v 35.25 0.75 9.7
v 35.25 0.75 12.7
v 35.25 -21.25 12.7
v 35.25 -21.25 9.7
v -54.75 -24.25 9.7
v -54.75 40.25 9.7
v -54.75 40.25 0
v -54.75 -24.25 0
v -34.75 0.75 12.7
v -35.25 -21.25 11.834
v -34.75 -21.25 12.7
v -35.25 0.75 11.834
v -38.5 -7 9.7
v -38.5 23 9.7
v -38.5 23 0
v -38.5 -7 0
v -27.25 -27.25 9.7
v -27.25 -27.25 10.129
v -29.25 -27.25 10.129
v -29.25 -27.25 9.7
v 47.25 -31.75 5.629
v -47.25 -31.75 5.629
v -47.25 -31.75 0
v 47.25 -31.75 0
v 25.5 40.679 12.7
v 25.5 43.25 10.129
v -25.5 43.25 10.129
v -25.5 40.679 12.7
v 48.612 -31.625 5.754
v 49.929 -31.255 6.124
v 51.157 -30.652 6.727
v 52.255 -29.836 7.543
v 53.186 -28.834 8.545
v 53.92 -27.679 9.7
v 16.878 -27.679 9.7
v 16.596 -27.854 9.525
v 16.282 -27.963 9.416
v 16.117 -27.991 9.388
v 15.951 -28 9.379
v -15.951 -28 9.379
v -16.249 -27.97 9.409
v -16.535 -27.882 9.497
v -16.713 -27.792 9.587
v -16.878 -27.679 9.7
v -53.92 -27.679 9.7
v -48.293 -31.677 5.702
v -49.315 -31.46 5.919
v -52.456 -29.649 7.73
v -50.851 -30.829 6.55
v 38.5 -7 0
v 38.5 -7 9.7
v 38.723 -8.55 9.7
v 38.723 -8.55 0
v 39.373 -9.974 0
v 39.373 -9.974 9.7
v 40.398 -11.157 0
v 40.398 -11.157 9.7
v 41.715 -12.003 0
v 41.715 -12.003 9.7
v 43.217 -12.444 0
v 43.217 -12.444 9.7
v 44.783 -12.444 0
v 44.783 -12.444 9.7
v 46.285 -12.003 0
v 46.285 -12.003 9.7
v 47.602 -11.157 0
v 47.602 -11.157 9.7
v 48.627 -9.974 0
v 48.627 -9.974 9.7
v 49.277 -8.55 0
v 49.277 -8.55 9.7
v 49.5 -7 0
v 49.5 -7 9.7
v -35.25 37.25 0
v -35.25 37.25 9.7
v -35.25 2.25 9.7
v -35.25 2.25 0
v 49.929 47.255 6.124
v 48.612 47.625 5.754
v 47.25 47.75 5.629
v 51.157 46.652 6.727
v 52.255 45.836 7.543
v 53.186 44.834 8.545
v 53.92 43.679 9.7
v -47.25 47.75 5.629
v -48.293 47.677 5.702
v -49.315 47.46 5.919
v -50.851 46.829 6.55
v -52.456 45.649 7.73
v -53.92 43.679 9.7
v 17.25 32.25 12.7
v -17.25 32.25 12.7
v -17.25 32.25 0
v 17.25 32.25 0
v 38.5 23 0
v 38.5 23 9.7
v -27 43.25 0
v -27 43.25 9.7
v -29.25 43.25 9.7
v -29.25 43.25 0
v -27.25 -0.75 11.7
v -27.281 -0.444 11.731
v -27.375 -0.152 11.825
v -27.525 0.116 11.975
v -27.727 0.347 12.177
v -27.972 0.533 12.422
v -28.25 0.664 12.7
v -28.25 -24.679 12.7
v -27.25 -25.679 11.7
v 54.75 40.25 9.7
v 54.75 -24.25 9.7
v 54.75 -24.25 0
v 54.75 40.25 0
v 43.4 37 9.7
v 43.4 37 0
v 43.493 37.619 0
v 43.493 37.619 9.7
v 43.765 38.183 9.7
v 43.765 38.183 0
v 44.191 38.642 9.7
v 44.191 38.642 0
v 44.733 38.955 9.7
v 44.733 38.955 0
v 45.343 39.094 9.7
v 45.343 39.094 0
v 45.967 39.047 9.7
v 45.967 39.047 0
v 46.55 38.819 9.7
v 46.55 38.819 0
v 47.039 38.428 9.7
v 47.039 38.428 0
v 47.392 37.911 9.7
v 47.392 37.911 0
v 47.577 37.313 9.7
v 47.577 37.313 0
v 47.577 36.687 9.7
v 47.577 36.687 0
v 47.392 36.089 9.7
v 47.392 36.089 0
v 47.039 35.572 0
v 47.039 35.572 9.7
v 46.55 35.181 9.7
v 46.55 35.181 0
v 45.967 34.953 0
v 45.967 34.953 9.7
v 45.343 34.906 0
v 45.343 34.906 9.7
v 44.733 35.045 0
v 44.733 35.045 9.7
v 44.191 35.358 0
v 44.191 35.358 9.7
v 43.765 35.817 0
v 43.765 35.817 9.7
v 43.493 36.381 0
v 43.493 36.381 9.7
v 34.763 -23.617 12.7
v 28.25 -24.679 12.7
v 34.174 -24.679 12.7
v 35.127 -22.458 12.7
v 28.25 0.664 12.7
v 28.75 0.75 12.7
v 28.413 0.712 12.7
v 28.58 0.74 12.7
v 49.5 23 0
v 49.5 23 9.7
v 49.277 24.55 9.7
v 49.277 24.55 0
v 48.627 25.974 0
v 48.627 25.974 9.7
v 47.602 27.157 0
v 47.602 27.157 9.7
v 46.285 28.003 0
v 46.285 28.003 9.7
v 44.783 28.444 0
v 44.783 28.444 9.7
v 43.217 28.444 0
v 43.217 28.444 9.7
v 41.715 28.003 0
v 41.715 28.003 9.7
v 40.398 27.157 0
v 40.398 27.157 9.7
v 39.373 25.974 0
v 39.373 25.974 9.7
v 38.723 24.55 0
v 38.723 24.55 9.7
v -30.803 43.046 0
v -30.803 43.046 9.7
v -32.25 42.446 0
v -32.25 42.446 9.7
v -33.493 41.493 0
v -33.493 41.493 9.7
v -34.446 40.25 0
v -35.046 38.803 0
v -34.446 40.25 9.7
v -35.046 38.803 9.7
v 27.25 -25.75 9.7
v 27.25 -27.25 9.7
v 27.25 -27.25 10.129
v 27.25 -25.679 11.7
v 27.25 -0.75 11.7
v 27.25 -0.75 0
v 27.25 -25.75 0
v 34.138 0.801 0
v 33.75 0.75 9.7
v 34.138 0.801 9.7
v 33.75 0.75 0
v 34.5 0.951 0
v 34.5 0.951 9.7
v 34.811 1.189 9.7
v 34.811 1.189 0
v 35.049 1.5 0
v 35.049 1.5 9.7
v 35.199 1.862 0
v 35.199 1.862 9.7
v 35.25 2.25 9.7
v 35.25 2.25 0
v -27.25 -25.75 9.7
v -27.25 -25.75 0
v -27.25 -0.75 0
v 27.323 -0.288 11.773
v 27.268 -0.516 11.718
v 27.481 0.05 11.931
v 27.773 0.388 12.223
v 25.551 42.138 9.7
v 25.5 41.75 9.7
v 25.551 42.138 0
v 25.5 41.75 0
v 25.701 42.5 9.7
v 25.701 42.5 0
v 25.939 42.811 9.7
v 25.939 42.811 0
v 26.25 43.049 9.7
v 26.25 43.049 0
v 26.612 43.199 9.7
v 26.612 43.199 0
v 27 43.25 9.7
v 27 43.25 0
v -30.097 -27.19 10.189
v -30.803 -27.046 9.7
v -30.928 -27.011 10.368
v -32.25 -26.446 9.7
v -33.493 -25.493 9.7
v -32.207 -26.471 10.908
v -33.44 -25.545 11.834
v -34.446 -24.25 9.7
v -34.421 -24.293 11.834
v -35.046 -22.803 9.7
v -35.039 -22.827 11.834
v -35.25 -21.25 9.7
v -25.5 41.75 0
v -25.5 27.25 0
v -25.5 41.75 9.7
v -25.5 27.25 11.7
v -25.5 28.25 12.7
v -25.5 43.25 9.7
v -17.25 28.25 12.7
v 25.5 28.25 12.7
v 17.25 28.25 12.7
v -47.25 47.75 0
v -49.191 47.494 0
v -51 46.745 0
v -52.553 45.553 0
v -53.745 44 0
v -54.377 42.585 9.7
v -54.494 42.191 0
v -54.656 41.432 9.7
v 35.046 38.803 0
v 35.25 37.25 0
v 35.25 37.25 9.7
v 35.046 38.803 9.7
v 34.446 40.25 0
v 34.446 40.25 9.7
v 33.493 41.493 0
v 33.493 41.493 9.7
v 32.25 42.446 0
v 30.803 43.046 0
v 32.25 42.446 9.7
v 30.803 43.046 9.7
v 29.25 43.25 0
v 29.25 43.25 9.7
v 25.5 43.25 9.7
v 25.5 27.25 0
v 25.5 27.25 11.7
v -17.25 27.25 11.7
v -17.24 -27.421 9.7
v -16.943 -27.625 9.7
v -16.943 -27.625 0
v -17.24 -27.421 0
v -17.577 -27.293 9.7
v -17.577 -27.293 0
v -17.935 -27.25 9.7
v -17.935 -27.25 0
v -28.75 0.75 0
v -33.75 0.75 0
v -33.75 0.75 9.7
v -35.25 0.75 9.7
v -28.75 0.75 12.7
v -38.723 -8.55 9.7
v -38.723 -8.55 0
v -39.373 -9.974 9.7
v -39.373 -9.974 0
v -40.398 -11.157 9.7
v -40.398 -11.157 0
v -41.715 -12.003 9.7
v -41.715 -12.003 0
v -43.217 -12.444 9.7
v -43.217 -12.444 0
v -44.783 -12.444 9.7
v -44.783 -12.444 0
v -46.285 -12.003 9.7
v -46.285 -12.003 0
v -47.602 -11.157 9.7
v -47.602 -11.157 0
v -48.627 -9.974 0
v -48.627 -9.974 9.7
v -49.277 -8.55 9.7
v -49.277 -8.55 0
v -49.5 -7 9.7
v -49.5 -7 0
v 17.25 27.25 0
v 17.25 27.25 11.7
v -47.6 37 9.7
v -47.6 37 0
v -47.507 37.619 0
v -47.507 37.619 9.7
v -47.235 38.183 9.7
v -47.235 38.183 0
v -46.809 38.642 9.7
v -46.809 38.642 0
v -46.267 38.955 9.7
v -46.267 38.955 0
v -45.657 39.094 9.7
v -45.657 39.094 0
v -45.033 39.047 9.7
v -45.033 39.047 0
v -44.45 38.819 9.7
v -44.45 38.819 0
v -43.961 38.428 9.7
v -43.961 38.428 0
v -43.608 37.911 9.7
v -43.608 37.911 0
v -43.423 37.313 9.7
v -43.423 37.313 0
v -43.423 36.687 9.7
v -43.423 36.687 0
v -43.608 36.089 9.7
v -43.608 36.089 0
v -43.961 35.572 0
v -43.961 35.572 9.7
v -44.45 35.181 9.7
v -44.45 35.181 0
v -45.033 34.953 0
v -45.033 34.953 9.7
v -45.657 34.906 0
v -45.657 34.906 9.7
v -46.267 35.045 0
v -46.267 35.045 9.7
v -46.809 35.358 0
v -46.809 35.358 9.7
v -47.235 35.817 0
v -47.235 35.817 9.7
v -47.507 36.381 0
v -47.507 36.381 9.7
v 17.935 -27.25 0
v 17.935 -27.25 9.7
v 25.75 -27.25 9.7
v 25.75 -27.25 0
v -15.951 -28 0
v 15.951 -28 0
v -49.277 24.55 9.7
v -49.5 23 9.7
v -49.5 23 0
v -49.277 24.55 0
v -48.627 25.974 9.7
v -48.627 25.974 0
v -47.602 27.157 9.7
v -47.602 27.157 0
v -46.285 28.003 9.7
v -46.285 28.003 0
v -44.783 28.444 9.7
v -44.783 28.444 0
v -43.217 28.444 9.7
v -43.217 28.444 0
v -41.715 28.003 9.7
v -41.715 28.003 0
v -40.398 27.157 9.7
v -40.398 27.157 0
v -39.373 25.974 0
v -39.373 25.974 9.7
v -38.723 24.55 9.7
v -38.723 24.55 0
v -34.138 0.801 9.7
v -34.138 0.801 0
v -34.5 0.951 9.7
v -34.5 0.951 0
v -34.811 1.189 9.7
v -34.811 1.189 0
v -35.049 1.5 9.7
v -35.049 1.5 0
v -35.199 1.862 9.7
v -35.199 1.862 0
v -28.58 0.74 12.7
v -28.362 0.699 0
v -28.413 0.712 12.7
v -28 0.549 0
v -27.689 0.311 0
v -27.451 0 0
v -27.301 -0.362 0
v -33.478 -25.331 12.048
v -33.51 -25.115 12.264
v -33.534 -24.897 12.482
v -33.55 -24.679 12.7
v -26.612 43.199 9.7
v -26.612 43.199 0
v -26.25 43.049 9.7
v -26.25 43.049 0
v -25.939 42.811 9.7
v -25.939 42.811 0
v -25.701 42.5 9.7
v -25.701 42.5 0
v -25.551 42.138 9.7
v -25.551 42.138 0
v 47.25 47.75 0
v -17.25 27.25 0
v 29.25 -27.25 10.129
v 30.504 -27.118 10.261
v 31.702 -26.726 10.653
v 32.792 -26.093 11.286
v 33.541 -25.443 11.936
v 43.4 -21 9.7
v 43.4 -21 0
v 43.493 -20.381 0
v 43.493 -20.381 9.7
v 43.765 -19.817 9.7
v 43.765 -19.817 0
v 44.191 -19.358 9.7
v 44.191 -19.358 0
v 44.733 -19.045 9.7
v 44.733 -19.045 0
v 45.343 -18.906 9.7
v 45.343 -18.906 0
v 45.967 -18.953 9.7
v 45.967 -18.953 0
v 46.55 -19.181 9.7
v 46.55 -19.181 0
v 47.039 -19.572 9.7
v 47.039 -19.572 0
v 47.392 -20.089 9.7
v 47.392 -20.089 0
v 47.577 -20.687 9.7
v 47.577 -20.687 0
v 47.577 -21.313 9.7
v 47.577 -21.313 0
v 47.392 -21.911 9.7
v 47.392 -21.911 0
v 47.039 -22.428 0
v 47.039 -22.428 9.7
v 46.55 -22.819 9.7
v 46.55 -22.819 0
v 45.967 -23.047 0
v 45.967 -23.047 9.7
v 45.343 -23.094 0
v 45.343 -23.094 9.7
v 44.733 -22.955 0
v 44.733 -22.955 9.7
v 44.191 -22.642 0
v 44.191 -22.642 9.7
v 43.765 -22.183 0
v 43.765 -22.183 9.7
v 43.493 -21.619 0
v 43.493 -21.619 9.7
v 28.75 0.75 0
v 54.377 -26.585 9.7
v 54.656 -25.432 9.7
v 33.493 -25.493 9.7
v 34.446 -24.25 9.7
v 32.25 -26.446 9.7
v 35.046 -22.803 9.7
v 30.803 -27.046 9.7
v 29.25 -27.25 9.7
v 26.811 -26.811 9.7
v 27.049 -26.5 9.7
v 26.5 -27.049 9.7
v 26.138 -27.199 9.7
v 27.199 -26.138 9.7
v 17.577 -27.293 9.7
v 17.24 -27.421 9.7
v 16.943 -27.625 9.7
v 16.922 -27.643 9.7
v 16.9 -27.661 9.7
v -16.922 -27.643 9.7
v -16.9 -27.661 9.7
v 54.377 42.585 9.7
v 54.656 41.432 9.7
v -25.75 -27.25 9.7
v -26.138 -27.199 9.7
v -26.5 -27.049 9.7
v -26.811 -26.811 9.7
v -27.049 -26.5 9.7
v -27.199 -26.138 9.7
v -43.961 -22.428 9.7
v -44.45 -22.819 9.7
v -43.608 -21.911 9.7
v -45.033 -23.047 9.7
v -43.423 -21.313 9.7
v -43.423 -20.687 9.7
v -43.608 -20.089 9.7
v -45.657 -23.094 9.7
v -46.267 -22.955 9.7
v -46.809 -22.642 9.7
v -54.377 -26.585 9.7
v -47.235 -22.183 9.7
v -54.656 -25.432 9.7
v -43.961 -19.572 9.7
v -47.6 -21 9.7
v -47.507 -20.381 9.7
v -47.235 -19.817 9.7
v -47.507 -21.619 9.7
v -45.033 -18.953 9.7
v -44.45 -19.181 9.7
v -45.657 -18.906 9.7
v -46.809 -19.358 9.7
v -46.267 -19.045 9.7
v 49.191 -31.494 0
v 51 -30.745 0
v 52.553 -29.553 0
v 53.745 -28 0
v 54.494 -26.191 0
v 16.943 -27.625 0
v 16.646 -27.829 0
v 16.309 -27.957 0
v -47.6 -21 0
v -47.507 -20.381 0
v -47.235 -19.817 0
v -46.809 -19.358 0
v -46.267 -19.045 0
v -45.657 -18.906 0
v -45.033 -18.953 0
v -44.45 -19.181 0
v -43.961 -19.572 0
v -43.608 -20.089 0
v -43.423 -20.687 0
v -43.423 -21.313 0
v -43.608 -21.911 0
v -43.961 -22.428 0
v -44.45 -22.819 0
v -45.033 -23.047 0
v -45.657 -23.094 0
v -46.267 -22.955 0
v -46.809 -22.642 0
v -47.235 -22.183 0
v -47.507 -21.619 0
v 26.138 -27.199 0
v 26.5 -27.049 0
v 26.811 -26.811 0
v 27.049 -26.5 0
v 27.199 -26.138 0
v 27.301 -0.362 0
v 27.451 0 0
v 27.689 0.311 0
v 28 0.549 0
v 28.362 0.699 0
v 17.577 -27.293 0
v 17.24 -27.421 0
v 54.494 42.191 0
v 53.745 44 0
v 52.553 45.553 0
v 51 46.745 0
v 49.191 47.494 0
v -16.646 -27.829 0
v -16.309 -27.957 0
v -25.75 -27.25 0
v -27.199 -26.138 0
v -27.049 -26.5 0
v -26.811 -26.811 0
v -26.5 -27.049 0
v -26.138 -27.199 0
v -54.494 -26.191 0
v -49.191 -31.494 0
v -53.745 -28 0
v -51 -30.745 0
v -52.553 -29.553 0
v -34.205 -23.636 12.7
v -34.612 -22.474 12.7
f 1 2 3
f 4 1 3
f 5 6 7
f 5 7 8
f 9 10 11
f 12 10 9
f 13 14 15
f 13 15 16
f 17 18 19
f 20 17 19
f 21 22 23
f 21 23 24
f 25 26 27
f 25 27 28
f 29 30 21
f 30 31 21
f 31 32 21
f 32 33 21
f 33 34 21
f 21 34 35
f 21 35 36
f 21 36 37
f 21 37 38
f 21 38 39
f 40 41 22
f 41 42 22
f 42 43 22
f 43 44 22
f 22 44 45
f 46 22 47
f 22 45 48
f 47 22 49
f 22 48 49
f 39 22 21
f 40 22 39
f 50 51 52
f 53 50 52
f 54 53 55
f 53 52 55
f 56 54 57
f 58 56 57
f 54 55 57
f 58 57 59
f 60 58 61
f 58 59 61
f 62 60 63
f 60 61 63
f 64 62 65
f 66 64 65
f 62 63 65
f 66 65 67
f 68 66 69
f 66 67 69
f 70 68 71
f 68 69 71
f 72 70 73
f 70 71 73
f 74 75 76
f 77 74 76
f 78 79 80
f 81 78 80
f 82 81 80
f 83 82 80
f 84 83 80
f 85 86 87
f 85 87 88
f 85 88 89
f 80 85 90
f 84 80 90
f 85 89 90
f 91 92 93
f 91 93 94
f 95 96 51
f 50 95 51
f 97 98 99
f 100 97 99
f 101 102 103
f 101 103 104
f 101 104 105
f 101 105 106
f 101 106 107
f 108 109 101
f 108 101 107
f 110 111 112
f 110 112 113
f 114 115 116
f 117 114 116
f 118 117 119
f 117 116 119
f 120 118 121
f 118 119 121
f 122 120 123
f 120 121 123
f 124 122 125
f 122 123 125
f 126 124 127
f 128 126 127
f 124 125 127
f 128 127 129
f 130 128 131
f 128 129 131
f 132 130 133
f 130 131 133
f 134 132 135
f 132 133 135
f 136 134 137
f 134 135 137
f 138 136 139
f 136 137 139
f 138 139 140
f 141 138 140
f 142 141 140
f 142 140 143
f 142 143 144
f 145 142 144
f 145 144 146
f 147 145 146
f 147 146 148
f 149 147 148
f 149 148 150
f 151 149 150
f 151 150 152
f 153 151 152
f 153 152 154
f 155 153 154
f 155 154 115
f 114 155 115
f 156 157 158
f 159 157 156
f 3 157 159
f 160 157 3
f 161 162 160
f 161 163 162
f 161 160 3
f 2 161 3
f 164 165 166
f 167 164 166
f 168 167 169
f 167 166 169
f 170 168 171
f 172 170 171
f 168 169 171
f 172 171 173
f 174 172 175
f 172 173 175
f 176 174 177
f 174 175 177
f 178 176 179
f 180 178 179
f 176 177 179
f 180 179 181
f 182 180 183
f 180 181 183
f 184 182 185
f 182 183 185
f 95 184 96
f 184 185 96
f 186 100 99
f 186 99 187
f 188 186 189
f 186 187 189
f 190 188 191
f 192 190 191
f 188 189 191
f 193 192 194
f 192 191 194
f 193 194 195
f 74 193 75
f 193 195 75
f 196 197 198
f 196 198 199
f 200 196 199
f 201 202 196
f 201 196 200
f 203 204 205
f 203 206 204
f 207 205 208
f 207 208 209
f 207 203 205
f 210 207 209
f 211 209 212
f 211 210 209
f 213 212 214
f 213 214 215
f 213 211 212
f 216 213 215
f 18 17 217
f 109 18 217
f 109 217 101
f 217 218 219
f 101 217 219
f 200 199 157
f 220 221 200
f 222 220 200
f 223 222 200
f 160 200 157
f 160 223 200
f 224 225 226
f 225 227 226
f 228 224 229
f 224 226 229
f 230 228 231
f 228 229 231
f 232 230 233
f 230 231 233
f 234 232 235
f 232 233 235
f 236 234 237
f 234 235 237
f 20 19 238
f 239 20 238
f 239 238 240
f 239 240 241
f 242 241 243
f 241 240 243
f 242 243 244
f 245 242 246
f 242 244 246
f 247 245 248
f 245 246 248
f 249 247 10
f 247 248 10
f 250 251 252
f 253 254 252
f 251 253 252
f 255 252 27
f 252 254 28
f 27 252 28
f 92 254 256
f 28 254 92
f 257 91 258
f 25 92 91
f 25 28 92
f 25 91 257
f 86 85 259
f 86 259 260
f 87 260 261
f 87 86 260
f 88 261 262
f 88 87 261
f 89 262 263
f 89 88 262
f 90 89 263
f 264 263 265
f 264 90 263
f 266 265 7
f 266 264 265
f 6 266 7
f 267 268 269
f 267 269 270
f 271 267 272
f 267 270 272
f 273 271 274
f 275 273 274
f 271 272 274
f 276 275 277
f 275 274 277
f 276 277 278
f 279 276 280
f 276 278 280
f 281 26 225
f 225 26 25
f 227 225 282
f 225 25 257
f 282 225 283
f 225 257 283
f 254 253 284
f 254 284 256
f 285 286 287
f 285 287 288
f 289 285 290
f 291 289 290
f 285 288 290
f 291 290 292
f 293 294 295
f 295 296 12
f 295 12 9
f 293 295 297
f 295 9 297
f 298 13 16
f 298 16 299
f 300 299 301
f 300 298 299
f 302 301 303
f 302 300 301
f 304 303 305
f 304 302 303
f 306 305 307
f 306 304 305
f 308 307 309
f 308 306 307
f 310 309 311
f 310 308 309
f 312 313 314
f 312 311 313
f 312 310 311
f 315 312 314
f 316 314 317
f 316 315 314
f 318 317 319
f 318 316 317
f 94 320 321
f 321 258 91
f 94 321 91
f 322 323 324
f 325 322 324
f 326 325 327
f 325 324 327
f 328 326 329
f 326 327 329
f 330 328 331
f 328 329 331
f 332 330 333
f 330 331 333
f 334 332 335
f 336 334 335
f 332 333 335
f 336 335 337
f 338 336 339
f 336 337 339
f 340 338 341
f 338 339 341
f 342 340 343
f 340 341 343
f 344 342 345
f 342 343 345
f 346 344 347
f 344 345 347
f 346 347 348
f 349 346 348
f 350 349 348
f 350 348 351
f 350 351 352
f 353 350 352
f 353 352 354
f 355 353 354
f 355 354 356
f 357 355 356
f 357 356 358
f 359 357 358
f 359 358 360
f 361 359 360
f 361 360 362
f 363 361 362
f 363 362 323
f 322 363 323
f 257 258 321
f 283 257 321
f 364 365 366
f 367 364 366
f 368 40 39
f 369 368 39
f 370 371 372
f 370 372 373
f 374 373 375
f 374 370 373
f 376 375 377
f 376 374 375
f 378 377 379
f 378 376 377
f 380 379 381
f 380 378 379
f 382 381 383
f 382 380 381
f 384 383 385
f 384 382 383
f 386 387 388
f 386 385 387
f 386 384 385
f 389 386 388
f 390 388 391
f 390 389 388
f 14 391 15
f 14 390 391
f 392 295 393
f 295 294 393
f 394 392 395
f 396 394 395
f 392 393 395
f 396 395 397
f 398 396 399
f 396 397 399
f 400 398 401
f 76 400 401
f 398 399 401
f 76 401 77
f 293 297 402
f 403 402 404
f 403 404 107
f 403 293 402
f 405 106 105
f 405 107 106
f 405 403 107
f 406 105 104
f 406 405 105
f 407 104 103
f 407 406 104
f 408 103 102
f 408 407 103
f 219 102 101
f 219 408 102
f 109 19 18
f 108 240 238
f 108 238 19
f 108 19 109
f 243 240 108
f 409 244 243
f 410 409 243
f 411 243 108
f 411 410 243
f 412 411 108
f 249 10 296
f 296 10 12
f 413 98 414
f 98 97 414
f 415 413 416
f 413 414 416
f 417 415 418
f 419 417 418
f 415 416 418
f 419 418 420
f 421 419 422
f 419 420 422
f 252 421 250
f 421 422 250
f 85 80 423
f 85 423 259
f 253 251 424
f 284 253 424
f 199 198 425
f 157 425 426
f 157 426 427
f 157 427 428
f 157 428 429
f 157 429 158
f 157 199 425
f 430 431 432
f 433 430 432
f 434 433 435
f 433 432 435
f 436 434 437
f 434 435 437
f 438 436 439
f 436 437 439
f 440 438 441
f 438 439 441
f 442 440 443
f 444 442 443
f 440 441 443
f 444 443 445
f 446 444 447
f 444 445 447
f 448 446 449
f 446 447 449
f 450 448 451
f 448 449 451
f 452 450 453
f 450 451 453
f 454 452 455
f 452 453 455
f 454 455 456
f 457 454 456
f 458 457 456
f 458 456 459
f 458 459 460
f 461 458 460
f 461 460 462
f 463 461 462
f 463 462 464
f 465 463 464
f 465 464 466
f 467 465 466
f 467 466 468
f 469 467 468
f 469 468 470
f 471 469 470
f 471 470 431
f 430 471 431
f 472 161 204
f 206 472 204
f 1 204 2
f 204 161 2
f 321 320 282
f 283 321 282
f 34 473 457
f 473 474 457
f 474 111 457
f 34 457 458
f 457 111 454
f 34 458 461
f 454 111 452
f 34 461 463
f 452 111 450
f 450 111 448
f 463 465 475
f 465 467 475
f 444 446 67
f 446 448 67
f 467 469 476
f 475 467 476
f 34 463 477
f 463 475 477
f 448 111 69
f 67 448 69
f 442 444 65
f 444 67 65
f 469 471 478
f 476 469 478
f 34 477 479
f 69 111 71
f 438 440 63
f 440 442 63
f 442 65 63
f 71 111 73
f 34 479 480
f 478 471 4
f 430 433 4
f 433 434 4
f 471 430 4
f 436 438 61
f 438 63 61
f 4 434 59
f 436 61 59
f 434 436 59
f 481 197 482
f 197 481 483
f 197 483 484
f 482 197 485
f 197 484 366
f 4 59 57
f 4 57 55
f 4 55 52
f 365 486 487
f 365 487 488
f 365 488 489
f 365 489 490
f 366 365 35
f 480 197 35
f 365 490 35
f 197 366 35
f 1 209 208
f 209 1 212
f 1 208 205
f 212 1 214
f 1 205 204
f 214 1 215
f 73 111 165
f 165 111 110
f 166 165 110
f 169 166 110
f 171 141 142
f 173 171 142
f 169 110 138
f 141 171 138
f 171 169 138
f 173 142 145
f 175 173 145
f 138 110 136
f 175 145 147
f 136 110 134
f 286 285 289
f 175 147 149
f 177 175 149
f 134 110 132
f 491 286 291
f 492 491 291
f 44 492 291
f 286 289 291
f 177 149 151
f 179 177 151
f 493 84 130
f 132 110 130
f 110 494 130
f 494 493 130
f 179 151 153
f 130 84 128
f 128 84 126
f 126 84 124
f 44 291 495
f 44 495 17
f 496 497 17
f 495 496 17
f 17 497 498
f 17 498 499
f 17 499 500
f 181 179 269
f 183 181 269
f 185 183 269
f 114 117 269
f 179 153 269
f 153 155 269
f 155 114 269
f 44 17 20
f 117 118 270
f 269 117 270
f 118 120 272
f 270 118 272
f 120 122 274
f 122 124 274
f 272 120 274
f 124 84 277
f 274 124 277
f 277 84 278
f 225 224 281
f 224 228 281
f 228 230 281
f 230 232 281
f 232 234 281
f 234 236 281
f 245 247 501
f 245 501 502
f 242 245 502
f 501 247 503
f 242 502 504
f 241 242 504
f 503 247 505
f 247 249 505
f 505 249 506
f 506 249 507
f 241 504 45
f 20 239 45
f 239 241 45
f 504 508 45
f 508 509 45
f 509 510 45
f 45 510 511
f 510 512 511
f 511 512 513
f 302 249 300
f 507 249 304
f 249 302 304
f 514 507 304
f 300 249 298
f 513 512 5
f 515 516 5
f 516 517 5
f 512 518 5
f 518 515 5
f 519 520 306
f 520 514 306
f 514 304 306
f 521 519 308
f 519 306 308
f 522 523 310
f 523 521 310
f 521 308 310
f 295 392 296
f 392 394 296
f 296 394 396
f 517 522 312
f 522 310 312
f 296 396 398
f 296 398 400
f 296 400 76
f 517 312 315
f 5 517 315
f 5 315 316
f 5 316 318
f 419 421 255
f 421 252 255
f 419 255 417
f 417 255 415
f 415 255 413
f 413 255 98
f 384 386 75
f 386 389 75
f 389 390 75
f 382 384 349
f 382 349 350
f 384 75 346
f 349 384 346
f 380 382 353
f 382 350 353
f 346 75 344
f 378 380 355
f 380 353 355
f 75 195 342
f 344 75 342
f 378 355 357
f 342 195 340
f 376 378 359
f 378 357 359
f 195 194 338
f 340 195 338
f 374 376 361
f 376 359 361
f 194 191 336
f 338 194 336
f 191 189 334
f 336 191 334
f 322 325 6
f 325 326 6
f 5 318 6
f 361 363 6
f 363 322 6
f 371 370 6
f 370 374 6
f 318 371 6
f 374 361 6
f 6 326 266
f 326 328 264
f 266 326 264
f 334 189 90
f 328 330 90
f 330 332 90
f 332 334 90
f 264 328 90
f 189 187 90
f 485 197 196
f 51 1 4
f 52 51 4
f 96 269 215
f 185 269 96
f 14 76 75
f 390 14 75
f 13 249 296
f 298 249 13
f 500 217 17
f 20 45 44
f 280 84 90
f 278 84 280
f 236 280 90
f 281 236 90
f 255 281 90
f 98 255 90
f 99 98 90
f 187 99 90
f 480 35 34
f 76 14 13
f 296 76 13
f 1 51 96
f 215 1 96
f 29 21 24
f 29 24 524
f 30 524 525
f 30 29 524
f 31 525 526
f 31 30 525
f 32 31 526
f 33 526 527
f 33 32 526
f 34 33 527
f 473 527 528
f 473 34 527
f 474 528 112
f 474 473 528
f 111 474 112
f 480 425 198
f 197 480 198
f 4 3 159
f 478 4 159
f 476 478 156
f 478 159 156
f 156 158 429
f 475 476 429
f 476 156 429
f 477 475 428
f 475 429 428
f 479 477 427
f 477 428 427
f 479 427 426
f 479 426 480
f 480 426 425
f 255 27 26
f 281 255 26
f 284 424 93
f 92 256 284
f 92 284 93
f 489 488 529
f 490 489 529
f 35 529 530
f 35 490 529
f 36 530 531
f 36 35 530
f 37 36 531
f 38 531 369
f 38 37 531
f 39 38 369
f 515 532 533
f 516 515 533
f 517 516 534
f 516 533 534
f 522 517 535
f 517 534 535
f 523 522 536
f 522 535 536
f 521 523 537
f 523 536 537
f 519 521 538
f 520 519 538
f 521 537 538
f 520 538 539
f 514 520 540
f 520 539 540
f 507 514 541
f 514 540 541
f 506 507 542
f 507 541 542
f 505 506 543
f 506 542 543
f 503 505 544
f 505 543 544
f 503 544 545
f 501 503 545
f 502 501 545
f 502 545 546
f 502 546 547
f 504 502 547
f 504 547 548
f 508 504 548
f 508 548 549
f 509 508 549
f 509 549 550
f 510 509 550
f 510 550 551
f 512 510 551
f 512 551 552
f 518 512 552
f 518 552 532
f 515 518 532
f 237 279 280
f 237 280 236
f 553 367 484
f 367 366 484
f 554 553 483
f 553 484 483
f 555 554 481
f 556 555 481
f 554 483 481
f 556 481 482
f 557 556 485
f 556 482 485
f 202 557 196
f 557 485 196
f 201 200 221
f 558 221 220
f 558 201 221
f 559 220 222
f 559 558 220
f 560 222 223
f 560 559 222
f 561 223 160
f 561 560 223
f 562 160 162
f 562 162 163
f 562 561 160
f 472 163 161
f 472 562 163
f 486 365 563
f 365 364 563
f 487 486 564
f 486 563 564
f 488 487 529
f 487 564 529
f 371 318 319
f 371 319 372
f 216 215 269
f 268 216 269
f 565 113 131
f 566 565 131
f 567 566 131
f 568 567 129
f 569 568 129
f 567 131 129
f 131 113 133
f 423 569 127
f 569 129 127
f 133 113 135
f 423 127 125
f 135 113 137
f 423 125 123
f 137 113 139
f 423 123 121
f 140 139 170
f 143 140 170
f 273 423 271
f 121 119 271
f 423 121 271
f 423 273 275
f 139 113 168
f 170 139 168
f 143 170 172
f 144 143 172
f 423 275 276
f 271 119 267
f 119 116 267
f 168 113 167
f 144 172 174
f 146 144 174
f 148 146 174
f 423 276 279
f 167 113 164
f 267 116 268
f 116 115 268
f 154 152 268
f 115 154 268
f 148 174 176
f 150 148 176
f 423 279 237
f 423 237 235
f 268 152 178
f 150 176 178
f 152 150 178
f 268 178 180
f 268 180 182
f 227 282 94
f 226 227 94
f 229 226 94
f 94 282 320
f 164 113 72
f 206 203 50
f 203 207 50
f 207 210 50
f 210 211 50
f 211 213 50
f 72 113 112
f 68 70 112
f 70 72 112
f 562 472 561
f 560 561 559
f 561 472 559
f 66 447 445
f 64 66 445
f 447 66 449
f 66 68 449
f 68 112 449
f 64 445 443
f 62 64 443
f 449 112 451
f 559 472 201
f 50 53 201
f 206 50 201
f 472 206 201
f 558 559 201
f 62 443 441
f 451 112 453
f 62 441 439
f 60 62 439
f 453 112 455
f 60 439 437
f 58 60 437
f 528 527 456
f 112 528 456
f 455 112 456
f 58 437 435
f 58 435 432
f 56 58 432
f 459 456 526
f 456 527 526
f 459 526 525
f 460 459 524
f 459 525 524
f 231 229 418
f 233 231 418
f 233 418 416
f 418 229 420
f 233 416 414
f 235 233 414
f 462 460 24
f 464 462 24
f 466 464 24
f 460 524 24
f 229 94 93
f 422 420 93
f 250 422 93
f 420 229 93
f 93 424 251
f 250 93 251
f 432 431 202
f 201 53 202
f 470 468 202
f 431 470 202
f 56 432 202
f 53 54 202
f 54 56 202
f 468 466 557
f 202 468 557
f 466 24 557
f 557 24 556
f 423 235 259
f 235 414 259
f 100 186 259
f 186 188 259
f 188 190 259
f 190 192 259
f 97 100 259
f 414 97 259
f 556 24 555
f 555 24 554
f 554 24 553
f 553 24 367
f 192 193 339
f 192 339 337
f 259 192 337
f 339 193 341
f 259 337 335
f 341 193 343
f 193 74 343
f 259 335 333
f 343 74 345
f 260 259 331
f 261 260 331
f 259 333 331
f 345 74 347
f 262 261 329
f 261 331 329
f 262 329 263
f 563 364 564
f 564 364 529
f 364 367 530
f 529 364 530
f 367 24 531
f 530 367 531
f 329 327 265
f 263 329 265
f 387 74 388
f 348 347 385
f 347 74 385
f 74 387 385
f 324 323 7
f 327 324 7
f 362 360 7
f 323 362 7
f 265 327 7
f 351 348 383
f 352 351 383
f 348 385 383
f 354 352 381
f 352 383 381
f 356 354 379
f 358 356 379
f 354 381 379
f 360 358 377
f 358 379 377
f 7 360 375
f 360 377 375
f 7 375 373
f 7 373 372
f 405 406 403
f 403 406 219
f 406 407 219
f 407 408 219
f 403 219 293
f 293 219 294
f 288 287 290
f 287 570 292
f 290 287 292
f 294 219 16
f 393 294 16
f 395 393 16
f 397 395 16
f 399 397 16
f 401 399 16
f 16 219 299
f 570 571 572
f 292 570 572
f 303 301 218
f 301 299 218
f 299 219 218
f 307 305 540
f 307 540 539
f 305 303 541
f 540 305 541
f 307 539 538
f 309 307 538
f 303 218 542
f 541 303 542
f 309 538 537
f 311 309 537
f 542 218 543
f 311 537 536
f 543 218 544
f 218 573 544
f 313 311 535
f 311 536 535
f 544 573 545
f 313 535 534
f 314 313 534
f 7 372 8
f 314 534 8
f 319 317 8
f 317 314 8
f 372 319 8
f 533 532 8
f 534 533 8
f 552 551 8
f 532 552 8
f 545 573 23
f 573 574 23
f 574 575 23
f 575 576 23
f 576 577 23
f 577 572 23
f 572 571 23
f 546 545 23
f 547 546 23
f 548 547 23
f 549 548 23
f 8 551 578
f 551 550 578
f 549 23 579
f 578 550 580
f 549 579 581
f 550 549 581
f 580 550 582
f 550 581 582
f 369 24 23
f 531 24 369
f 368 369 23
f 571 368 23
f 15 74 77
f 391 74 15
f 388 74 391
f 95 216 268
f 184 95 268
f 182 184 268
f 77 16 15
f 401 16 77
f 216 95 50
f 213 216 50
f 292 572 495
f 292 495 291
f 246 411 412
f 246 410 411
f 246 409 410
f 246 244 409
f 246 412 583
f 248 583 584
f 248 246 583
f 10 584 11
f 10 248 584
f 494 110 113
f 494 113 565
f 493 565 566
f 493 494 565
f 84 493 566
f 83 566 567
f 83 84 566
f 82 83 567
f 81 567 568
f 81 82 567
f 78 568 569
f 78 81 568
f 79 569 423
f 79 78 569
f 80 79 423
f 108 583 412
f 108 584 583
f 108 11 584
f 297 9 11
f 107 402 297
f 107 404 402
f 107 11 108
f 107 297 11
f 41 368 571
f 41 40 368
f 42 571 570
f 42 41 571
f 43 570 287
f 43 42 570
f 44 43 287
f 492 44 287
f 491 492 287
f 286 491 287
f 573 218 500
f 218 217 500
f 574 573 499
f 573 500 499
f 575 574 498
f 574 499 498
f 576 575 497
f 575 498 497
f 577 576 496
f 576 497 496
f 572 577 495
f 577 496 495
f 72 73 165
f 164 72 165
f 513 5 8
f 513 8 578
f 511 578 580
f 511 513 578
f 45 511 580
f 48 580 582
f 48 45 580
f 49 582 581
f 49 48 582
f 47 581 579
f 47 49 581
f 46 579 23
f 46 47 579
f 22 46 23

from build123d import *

# Parameters (mm, degrees)
SKETCH1_W                   = 79.5
SKETCH1_H                   = 79.5
SKETCH1_W_2                 = 54.5
SKETCH1_H_2                 = 54.5
BOSS_EXTRUDE1_DEPTH         = 12.7
CHAMFER2_SIZE               = 4
SKETCH2_W                   = 34.5
SKETCH2_H                   = 5
SKETCH2_H_2                 = 0.75
CUT_EXTRUDE1_DEPTH          = 64.41462765
BOSS_EXTRUDE2_DEPTH         = 12.7
CUT_EXTRUDE2_DEPTH          = 3
CUT_EXTRUDE3_DEPTH          = 121.131604917
CHAMFER5_SIZE               = 0.5
CHAMFER5_SIZE2              = 0.866025404
TAP_DRILL_FOR_M5X0_8_TAP3_D = 4.2
CUT_EXTRUDE4_DEPTH          = 74.291984555
FILLET1_R                   = 1.5
FILLET2_R                   = 1.5
FILLET3_R                   = 1.5
CHAMFER4_SIZE               = 1


with BuildPart() as part:
    # Sketch1 → Boss-Extrude1 (new body)
    with BuildSketch(Plane.XY):
        with Locations((0, 8)):
            Rectangle(SKETCH1_W, SKETCH1_H)
        Rectangle(SKETCH1_W_2, SKETCH1_H_2, mode=Mode.SUBTRACT)
    extrude(amount=BOSS_EXTRUDE1_DEPTH)

    # Chamfer2
    chamfer2_edges = [part.edges().sort_by_distance(p)[0] for p in [
        (39.75, -31.75, 6.35),
        (-39.75, -31.75, 6.35),
        (-39.75, 47.75, 6.35),
        (39.75, 47.75, 6.35),
    ]]
    chamfer(chamfer2_edges, length=CHAMFER2_SIZE)

    # Sketch2 → Cut-Extrude1 (cut, through all)
    with BuildSketch(Plane.XY.offset(12.7)):
        with BuildLine():
            Line((-27.25, 27.25), (-25.5, 27.25))
            Line((-25.5, 27.25), (-25.5, 43.25))
            Line((-25.5, 43.25), (-29.25, 43.25))
            ThreePointArc((-29.25, 43.25), (-33.492640687, 41.492640687), (-35.25, 37.25))
            Line((-35.25, 37.25), (-35.25, 0.75))
            Line((-35.25, 0.75), (-27.25, 0.75))
            Line((-27.25, 0.75), (-27.25, 27.25))
        make_face()
        with Locations((0, 29.75)):
            Rectangle(SKETCH2_W, SKETCH2_H)
        with BuildLine():
            Line((25.5, 43.25), (25.5, 27.25))
            Line((25.5, 27.25), (27.25, 27.25))
            Line((27.25, 27.25), (27.25, 0.75))
            Line((27.25, 0.75), (35.25, 0.75))
            Line((35.25, 0.75), (35.25, 37.25))
            ThreePointArc((35.25, 37.25), (33.492640687, 41.492640687), (29.25, 43.25))
            Line((29.25, 43.25), (25.5, 43.25))
        make_face()
        with Locations((0, -27.625)):
            Rectangle(SKETCH2_W, SKETCH2_H_2)
    extrude(amount=-CUT_EXTRUDE1_DEPTH, mode=Mode.SUBTRACT)

    # Sketch5 → Boss-Extrude2 (add)
    with BuildSketch(Plane.XY.offset(12.7)):
        with BuildLine():
            Line((-47.25, -31.75), (-35.75, -31.75))
            Line((-35.75, -31.75), (-39.75, -27.75))
            Line((-39.75, -27.75), (-39.75, 43.75))
            Line((-39.75, 43.75), (-35.75, 47.75))
            Line((-35.75, 47.75), (-47.25, 47.75))
            ThreePointArc((-47.25, 47.75), (-52.553300859, 45.553300859), (-54.75, 40.25))
            Line((-54.75, 40.25), (-54.75, -24.25))
            ThreePointArc((-54.75, -24.25), (-52.553300859, -29.553300859), (-47.25, -31.75))
        make_face()
        with BuildLine():
            Line((35.75, -31.75), (47.25, -31.75))
            ThreePointArc((47.25, -31.75), (52.553300859, -29.553300859), (54.75, -24.25))
            Line((54.75, -24.25), (54.75, 40.25))
            ThreePointArc((54.75, 40.25), (52.553300859, 45.553300859), (47.25, 47.75))
            Line((47.25, 47.75), (35.75, 47.75))
            Line((35.75, 47.75), (39.75, 43.75))
            Line((39.75, 43.75), (39.75, -27.75))
            Line((39.75, -27.75), (35.75, -31.75))
        make_face()
    extrude(amount=-BOSS_EXTRUDE2_DEPTH)

    # Sketch7 → Cut-Extrude2 (cut)
    with BuildSketch(Plane.XY.offset(12.7)):
        with BuildLine():
            ThreePointArc((54.75, 40.25), (52.553300859, 45.553300859), (47.25, 47.75))
            Line((47.25, 47.75), (-47.25, 47.75))
            ThreePointArc((-47.25, 47.75), (-52.553300859, 45.553300859), (-54.75, 40.25))
            Line((-54.75, 40.25), (-54.75, -24.25))
            ThreePointArc((-54.75, -24.25), (-52.553300859, -29.553300859), (-47.25, -31.75))
            Line((-47.25, -31.75), (47.25, -31.75))
            ThreePointArc((47.25, -31.75), (52.553300859, -29.553300859), (54.75, -24.25))
            Line((54.75, -24.25), (54.75, 40.25))
        make_face()
        with BuildLine():
            ThreePointArc((35.25, -21.25), (33.492640687, -25.492640687), (29.25, -27.25))
            Line((29.25, -27.25), (27.25, -27.25))
            Line((27.25, -27.25), (17.25, -27.25))
            Line((17.25, -27.25), (17.25, -28))
            Line((17.25, -28), (-17.25, -28))
            Line((-17.25, -28), (-17.25, -27.25))
            Line((-17.25, -27.25), (-27.25, -27.25))
            Line((-27.25, -27.25), (-29.25, -27.25))
            ThreePointArc((-29.25, -27.25), (-33.492640687, -25.492640687), (-35.25, -21.25))
            Line((-35.25, -21.25), (-35.25, 0.75))
            Line((-35.25, 0.75), (-35.25, 37.25))
            ThreePointArc((-35.25, 37.25), (-33.492640687, 41.492640687), (-29.25, 43.25))
            Line((-29.25, 43.25), (-25.5, 43.25))
            Line((-25.5, 43.25), (25.5, 43.25))
            Line((25.5, 43.25), (29.25, 43.25))
            ThreePointArc((29.25, 43.25), (33.492640687, 41.492640687), (35.25, 37.25))
            Line((35.25, 37.25), (35.25, 0.75))
            Line((35.25, 0.75), (35.25, -21.25))
        make_face(mode=Mode.SUBTRACT)
    extrude(amount=-CUT_EXTRUDE2_DEPTH, mode=Mode.SUBTRACT)

    # Sketch8 → Cut-Extrude3 (cut, through all)
    with BuildSketch(Plane.ZY.offset(54.75)):
        Polygon((5.628932188, -31.75), (12.7, -24.678932188), (12.7, -31.75), align=None)
        Polygon((12.7, 47.75), (5.628932188, 47.75), (12.7, 40.678932188), align=None)
    extrude(amount=-CUT_EXTRUDE3_DEPTH, mode=Mode.SUBTRACT)

    # Chamfer5
    chamfer5_edges = [part.edges().sort_by_distance(p)[0] for p in [
        (-35.25, -10.25, 12.7),
        (-34.974594209, -23.046947729, 12.7),
    ]]
    chamfer5_side = [part.faces().sort_by_distance(p)[0] for p in [
        (-31.22846957, -11.895050932, 12.7),
    ]]
    chamfer(chamfer5_edges, length=CHAMFER5_SIZE, length2=CHAMFER5_SIZE2, reference=chamfer5_side[0])

    # Tap Drill for M5x0.8 Tap3 (through all)
    with Locations(Plane.XY.offset(9.7)):
        with Locations((-45.5, 37), (-45.5, -21), (45.5, -21), (45.5, 37)):
            Hole(TAP_DRILL_FOR_M5X0_8_TAP3_D / 2)

    # Sketch11 → Cut-Extrude4 (cut, through all)
    with BuildSketch(Plane.XY.offset(9.7)):
        with BuildLine():
            Line((-38.5, 23), (-38.5, -7))
            ThreePointArc((-38.5, -7), (-44, -12.5), (-49.5, -7))
            Line((-49.5, -7), (-49.5, 23))
            ThreePointArc((-49.5, 23), (-44, 28.5), (-38.5, 23))
        make_face()
        with BuildLine():
            Line((38.5, 23), (38.5, -7))
            ThreePointArc((38.5, -7), (44, -12.5), (49.5, -7))
            Line((49.5, -7), (49.5, 23))
            ThreePointArc((49.5, 23), (44, 28.5), (38.5, 23))
        make_face()
    extrude(amount=-CUT_EXTRUDE4_DEPTH, mode=Mode.SUBTRACT)

    # Fillet1
    fillet1_edges = [part.edges().sort_by_distance(p)[0] for p in [
        (-27.25, -27.25, 4.85),
        (27.25, -27.25, 4.85),
        (-25.5, 43.25, 4.85),
        (-27.25, 0.75, 6.35),
        (-35.25, 0.75, 4.85),
        (35.25, 0.75, 4.85),
        (27.25, 0.75, 6.35),
        (25.5, 43.25, 4.85),
    ]]
    fillet(fillet1_edges, radius=FILLET1_R)

    # Fillet2
    # the kernel refuses this fillet: 1.5 mm, written as the material it adds along each edge
    with BuildSketch(Plane(origin=(17.25, -28, 12.626527452), x_dir=(0, 1, 0), z_dir=(0, 0, -1))) as fillet2_piece_1_section:
        with BuildLine():
            CenterArc((1.5, -1.299038106), FILLET2_R, 120, 60)
            Line((0, -1.299038106), (-0.03, -1.299038106))
            Line((-0.03, -1.299038106), (-0.03, 0))
            Line((-0.03, 0), (0, 0.03))
            ThreePointArc((0, 0.03), (0.375, 0.03), (0.735, 0.025980762))
            Line((0.735, 0.025980762), (0.75, 0))
        make_face()
    fillet2_piece_1 = extrude(amount=12.626527452, mode=Mode.PRIVATE)
    fillet2_piece_1 = split(fillet2_piece_1, bisect_by=Plane(origin=(16.927844244, -27.803524046, 9.7), z_dir=(0, 0, -1)), keep=Keep.TOP, mode=Mode.PRIVATE)
    fillet2_piece_1 = split(fillet2_piece_1, bisect_by=Plane(origin=(16.927844244, -30.206033858, 7.17289833), z_dir=(0, 0.7071067811865475, -0.7071067811865477)), keep=Keep.TOP, mode=Mode.PRIVATE)
    add(fillet2_piece_1)
    with BuildSketch(Plane(origin=(-17.25, -28, 12.626527452), x_dir=(1, 0, 0), z_dir=(0, 0, -1))) as fillet2_piece_2_section:
        with BuildLine():
            CenterArc((1.299038106, -1.5), FILLET2_R, 90, 60)
            Line((0, -0.75), (-0.025980762, -0.735))
            ThreePointArc((-0.025980762, -0.735), (-0.03, -0.375), (-0.03, 0))
            Line((-0.03, 0), (0, 0.03))
            Line((0, 0.03), (1.299038106, 0.03))
            Line((1.299038106, 0.03), (1.299038106, 0))
        make_face()
    fillet2_piece_2 = extrude(amount=12.626527452, mode=Mode.PRIVATE)
    fillet2_piece_2 = split(fillet2_piece_2, bisect_by=Plane(origin=(-16.927844244, -27.803524046, 9.7), z_dir=(0, 0, -1)), keep=Keep.TOP, mode=Mode.PRIVATE)
    fillet2_piece_2 = split(fillet2_piece_2, bisect_by=Plane(origin=(-16.927844244, -30.206033859, 7.172898329), z_dir=(0, 0.7071067811865475, -0.7071067811865477)), keep=Keep.TOP, mode=Mode.PRIVATE)
    add(fillet2_piece_2)

    # Fillet3
    fillet3_edges = [part.edges().sort_by_distance(p)[0] for p in [
        (-17.25, -27.25, 4.85),
        (17.25, -27.25, 4.85),
    ]]
    fillet(fillet3_edges, radius=FILLET3_R)

    # Chamfer4
    # the kernel refuses this chamfer: 1 mm, written as the material it takes off along each edge
    with BuildSketch(Plane(origin=(-27.25, -27.250615176, 12.7), x_dir=(0.027495876610585647, 0, -0.9996219169112968), z_dir=(0, 1, 0)), Plane(origin=(27.25, 1.821682988, 12.7), x_dir=(-0.027495876610585647, 0, -0.9996219169112968), z_dir=(0, -1, 0))) as chamfer4_piece_1:
        Polygon((CHAMFER4_SIZE * 0.999621916911, CHAMFER4_SIZE * 0.0274958766106), (-CHAMFER4_SIZE * 0.0274958766106, CHAMFER4_SIZE * 0.999621916911), (0, 0), align=None)
    extrude(amount=29.072298164, mode=Mode.SUBTRACT)
    with BuildSketch(Plane(origin=(-28.071682988, 27.25, 12.7), x_dir=(0, -0.027495876610585647, -0.9996219169112968), z_dir=(1, 0, 0))) as chamfer4_piece_2:
        Polygon((CHAMFER4_SIZE * 0.999621916911, CHAMFER4_SIZE * 0.0274958766106), (-CHAMFER4_SIZE * 0.0274958766106, CHAMFER4_SIZE * 0.999621916911), (0, 0), align=None)
    extrude(amount=13.393365976, mode=Mode.SUBTRACT)
    with BuildSketch(Plane(origin=(14.678317012, 27.25, 12.7), x_dir=(0, 0.9996219169112968, 0.027495876610585647), z_dir=(1, 0, 0))) as chamfer4_piece_3:
        Polygon((CHAMFER4_SIZE * 0.999621916911, -CHAMFER4_SIZE * 0.0274958766106), (-CHAMFER4_SIZE * 0.0274958766106, -CHAMFER4_SIZE * 0.999621916911), (0, 0), align=None)
    extrude(amount=13.393365976, mode=Mode.SUBTRACT)


solid = part.part
